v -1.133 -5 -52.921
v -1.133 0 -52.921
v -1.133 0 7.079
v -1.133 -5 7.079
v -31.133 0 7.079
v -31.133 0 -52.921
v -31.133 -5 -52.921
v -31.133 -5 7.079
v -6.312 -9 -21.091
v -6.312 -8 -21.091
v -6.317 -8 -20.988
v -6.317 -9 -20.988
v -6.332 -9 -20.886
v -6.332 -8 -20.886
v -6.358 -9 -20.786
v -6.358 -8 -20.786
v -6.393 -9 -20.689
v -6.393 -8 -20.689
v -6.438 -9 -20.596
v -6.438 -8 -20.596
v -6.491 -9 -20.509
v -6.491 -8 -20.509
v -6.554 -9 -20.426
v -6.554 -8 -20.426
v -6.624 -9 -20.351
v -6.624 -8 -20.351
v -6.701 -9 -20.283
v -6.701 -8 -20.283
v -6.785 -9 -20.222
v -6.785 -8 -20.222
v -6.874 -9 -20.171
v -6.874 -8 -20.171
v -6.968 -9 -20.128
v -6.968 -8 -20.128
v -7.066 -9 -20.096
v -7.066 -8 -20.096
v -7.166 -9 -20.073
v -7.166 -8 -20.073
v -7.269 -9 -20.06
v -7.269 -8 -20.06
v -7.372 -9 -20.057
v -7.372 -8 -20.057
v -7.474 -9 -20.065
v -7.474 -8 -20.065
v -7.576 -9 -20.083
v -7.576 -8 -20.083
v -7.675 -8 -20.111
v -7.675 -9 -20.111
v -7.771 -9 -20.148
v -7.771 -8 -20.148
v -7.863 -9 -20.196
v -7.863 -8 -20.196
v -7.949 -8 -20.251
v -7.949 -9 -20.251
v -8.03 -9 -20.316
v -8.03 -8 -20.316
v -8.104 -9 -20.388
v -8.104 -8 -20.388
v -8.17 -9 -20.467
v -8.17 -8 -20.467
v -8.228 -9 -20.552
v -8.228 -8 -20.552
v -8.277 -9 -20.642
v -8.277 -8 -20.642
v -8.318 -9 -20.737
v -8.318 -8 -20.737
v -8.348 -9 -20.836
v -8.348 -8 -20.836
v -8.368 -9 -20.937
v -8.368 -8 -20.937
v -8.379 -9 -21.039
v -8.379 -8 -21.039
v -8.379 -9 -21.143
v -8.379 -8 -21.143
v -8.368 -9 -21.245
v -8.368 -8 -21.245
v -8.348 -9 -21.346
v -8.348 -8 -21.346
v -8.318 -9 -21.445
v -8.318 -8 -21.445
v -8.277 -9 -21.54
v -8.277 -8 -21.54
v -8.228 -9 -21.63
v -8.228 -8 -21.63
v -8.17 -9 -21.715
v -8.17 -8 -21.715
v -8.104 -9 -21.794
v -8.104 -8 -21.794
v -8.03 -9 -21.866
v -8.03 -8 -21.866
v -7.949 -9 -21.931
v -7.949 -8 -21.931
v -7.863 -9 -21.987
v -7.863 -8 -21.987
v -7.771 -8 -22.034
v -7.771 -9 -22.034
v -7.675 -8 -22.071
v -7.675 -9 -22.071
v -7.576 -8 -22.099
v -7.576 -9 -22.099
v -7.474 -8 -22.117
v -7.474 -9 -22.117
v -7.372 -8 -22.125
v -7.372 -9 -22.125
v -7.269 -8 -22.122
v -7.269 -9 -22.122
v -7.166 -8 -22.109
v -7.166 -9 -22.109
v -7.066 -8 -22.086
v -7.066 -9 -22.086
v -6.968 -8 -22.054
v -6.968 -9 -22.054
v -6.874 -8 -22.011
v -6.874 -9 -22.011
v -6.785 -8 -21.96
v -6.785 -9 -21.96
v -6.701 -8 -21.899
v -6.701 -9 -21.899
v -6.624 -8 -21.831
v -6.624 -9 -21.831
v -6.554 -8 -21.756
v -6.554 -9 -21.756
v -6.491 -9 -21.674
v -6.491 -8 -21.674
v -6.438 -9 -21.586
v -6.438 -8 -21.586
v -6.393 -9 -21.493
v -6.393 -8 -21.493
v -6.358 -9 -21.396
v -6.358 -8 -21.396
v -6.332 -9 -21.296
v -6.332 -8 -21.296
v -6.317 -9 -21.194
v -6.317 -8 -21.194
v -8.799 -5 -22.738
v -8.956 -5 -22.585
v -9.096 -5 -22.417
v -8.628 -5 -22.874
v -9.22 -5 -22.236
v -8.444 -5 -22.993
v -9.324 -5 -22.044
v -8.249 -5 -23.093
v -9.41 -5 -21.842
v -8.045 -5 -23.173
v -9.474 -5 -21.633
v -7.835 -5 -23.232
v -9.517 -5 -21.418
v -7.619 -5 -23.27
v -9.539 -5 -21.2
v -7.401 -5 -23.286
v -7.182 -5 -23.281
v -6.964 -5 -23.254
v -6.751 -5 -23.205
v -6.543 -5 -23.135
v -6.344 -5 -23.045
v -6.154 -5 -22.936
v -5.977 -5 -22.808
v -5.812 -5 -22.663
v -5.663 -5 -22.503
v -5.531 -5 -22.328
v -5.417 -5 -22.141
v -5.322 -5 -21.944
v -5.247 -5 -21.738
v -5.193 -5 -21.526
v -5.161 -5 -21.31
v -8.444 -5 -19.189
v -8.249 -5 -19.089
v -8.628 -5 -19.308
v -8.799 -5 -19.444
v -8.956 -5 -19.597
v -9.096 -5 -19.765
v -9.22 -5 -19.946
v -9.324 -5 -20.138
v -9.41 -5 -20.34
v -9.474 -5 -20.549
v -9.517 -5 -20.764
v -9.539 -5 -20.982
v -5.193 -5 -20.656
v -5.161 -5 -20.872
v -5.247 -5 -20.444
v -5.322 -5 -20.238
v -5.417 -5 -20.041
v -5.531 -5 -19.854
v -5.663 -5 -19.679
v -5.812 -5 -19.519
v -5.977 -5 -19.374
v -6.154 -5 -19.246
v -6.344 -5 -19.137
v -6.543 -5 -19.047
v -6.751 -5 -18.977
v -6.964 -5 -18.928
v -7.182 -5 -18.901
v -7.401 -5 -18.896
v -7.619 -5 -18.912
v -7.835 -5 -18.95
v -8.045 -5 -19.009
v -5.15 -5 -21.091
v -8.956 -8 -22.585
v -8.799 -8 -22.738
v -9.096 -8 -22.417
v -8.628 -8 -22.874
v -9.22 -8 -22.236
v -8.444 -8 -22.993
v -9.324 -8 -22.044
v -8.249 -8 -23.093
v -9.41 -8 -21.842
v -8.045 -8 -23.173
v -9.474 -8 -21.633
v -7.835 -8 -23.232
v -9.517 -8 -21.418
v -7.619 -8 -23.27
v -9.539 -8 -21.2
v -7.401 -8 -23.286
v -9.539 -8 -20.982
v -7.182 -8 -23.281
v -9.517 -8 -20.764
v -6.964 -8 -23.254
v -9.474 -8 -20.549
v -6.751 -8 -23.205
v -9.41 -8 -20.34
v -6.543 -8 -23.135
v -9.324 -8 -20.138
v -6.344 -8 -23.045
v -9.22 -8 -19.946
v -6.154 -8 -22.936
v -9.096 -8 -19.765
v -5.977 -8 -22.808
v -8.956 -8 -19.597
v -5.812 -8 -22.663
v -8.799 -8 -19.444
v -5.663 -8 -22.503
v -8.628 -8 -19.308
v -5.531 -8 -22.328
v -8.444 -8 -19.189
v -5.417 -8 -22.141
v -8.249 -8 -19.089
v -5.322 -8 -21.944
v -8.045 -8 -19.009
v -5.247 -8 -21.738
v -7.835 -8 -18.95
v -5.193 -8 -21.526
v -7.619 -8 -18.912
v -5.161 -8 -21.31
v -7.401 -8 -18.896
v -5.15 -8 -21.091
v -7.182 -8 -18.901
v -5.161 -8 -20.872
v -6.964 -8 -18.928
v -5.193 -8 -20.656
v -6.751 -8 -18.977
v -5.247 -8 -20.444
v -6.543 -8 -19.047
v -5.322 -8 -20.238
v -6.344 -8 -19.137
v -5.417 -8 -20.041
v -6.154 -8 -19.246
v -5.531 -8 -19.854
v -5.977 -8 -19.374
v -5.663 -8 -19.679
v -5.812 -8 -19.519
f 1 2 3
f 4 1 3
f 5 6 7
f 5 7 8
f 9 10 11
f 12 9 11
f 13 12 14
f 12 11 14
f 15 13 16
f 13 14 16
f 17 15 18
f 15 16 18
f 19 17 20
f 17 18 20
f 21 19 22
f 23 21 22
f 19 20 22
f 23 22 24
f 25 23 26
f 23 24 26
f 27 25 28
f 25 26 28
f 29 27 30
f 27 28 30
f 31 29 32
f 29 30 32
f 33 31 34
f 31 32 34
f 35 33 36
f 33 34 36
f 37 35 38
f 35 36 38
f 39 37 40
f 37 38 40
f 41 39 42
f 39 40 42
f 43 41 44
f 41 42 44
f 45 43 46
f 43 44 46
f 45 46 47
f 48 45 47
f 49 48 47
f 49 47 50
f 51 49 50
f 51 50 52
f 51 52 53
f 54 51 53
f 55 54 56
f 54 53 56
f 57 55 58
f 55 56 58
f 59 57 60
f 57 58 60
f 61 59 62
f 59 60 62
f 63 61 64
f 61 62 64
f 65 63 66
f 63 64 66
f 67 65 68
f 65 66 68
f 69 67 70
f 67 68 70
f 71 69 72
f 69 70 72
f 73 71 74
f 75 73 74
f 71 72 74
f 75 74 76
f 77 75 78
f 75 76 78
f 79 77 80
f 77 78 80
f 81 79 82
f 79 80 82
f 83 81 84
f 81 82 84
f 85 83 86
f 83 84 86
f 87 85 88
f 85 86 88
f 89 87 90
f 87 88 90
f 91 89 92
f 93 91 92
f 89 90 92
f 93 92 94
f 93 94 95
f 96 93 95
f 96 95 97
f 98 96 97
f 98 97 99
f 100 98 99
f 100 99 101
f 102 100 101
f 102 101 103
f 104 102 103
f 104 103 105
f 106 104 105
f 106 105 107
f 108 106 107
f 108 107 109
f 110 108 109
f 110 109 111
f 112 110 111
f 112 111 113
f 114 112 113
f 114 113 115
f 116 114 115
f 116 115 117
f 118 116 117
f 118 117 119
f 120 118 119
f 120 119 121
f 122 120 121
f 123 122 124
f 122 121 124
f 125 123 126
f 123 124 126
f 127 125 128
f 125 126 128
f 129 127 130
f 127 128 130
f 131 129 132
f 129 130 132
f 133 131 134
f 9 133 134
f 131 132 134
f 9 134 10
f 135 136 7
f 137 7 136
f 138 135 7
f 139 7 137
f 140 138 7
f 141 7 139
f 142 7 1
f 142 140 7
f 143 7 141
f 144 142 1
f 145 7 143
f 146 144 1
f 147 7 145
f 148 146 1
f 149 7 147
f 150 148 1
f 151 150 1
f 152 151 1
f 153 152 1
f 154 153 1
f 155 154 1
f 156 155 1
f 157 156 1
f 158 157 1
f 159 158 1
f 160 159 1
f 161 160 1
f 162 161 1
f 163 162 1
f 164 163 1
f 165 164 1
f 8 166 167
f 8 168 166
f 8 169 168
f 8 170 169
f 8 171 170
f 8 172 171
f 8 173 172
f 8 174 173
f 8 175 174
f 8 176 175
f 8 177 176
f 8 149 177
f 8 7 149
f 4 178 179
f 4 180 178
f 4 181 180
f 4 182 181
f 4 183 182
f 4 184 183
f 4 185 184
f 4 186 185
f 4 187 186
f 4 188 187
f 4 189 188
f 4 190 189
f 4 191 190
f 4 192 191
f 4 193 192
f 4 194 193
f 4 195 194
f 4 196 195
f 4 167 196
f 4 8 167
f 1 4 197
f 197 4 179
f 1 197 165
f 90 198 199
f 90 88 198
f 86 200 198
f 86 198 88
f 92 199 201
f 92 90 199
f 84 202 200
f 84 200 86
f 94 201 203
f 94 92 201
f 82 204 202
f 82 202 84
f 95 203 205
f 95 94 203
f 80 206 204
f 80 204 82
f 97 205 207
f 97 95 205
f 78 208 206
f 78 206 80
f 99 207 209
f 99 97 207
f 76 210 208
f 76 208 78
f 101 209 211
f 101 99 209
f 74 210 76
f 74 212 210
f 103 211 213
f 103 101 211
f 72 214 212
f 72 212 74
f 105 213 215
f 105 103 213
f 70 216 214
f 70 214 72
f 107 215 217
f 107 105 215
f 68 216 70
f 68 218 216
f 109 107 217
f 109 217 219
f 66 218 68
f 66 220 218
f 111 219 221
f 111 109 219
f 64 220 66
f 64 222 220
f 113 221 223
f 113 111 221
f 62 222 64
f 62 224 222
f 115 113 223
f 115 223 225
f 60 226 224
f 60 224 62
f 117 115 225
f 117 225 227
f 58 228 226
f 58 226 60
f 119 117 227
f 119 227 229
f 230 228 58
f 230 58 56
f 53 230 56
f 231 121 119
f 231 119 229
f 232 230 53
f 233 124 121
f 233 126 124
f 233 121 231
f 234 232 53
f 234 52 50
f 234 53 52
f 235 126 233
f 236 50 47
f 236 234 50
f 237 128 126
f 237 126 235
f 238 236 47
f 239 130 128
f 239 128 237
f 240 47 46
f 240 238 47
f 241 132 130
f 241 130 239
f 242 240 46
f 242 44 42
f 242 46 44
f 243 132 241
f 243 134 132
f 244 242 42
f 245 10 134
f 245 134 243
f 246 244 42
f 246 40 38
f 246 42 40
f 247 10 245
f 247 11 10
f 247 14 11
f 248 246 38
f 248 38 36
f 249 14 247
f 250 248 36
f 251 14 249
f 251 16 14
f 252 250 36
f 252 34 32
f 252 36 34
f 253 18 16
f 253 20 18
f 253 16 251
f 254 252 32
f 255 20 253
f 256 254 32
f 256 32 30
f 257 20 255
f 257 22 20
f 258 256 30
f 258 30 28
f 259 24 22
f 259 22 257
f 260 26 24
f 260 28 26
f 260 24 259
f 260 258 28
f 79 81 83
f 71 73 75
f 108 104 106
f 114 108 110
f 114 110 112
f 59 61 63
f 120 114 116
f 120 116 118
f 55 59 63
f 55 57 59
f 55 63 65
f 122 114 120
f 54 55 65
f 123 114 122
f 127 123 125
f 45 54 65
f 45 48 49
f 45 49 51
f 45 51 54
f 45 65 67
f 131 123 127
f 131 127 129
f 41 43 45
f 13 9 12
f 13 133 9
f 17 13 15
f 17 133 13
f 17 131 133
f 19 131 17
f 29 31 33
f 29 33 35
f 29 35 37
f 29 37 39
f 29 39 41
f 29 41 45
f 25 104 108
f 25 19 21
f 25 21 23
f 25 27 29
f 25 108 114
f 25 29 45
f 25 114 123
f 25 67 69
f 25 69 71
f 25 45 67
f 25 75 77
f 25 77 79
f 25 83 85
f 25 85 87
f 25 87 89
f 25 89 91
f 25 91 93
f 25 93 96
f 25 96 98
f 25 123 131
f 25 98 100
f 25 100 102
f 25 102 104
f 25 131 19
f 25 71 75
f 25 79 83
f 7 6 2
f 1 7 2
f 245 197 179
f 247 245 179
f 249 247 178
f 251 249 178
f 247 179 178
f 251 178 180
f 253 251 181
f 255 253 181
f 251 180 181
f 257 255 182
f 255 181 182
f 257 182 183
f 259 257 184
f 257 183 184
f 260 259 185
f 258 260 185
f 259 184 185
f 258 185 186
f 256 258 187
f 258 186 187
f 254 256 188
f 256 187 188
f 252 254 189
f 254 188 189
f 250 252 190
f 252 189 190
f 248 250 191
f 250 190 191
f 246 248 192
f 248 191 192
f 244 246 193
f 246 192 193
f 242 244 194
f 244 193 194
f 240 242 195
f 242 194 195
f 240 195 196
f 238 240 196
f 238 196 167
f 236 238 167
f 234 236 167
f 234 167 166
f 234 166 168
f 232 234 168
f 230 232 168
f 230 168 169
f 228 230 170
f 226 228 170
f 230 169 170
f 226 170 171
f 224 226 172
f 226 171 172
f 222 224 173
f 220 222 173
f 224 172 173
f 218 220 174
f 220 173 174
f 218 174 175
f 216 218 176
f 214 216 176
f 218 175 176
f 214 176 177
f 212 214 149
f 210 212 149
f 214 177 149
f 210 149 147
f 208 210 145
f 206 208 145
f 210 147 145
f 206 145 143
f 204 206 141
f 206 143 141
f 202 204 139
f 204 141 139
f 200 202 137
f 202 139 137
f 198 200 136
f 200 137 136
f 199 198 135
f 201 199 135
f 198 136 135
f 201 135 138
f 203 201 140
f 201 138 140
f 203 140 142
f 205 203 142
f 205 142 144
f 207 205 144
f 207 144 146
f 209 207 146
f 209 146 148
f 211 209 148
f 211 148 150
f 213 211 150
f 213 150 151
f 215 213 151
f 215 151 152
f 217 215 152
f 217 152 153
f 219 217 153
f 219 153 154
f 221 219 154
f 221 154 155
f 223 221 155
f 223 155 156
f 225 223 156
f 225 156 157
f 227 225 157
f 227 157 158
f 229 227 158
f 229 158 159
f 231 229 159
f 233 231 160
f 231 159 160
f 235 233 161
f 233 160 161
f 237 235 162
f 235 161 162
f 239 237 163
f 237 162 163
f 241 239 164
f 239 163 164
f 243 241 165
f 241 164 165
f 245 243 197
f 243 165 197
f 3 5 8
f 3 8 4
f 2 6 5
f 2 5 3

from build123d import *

# Parameters (mm, degrees)
F0_W     = 30
F0_H     = 60
F1_DEPTH = 5
F2_R     = 2.196128
F3_DEPTH = 3
F4_R     = 1.034036
F5_DEPTH = 1


with BuildPart() as f1:
    # F0 (on Front) → F1 (new body)
    with BuildSketch(Plane.XZ):
        with Locations((-16.133093, -22.920842)):
            Rectangle(F0_W, F0_H)
    extrude(amount=F1_DEPTH)

    # F2 (on face) → F3 (join)
    with BuildSketch(Plane.XZ.offset(5)):
        with Locations((-7.345827, -21.091014)):
            Circle(F2_R)
    extrude(amount=F3_DEPTH)

    # F4 (on face) → F5 (join)
    with BuildSketch(Plane.XZ.offset(8)):
        with Locations((-7.345827, -21.091014)):
            Circle(F4_R)
    extrude(amount=F5_DEPTH)


solid = f1.part
